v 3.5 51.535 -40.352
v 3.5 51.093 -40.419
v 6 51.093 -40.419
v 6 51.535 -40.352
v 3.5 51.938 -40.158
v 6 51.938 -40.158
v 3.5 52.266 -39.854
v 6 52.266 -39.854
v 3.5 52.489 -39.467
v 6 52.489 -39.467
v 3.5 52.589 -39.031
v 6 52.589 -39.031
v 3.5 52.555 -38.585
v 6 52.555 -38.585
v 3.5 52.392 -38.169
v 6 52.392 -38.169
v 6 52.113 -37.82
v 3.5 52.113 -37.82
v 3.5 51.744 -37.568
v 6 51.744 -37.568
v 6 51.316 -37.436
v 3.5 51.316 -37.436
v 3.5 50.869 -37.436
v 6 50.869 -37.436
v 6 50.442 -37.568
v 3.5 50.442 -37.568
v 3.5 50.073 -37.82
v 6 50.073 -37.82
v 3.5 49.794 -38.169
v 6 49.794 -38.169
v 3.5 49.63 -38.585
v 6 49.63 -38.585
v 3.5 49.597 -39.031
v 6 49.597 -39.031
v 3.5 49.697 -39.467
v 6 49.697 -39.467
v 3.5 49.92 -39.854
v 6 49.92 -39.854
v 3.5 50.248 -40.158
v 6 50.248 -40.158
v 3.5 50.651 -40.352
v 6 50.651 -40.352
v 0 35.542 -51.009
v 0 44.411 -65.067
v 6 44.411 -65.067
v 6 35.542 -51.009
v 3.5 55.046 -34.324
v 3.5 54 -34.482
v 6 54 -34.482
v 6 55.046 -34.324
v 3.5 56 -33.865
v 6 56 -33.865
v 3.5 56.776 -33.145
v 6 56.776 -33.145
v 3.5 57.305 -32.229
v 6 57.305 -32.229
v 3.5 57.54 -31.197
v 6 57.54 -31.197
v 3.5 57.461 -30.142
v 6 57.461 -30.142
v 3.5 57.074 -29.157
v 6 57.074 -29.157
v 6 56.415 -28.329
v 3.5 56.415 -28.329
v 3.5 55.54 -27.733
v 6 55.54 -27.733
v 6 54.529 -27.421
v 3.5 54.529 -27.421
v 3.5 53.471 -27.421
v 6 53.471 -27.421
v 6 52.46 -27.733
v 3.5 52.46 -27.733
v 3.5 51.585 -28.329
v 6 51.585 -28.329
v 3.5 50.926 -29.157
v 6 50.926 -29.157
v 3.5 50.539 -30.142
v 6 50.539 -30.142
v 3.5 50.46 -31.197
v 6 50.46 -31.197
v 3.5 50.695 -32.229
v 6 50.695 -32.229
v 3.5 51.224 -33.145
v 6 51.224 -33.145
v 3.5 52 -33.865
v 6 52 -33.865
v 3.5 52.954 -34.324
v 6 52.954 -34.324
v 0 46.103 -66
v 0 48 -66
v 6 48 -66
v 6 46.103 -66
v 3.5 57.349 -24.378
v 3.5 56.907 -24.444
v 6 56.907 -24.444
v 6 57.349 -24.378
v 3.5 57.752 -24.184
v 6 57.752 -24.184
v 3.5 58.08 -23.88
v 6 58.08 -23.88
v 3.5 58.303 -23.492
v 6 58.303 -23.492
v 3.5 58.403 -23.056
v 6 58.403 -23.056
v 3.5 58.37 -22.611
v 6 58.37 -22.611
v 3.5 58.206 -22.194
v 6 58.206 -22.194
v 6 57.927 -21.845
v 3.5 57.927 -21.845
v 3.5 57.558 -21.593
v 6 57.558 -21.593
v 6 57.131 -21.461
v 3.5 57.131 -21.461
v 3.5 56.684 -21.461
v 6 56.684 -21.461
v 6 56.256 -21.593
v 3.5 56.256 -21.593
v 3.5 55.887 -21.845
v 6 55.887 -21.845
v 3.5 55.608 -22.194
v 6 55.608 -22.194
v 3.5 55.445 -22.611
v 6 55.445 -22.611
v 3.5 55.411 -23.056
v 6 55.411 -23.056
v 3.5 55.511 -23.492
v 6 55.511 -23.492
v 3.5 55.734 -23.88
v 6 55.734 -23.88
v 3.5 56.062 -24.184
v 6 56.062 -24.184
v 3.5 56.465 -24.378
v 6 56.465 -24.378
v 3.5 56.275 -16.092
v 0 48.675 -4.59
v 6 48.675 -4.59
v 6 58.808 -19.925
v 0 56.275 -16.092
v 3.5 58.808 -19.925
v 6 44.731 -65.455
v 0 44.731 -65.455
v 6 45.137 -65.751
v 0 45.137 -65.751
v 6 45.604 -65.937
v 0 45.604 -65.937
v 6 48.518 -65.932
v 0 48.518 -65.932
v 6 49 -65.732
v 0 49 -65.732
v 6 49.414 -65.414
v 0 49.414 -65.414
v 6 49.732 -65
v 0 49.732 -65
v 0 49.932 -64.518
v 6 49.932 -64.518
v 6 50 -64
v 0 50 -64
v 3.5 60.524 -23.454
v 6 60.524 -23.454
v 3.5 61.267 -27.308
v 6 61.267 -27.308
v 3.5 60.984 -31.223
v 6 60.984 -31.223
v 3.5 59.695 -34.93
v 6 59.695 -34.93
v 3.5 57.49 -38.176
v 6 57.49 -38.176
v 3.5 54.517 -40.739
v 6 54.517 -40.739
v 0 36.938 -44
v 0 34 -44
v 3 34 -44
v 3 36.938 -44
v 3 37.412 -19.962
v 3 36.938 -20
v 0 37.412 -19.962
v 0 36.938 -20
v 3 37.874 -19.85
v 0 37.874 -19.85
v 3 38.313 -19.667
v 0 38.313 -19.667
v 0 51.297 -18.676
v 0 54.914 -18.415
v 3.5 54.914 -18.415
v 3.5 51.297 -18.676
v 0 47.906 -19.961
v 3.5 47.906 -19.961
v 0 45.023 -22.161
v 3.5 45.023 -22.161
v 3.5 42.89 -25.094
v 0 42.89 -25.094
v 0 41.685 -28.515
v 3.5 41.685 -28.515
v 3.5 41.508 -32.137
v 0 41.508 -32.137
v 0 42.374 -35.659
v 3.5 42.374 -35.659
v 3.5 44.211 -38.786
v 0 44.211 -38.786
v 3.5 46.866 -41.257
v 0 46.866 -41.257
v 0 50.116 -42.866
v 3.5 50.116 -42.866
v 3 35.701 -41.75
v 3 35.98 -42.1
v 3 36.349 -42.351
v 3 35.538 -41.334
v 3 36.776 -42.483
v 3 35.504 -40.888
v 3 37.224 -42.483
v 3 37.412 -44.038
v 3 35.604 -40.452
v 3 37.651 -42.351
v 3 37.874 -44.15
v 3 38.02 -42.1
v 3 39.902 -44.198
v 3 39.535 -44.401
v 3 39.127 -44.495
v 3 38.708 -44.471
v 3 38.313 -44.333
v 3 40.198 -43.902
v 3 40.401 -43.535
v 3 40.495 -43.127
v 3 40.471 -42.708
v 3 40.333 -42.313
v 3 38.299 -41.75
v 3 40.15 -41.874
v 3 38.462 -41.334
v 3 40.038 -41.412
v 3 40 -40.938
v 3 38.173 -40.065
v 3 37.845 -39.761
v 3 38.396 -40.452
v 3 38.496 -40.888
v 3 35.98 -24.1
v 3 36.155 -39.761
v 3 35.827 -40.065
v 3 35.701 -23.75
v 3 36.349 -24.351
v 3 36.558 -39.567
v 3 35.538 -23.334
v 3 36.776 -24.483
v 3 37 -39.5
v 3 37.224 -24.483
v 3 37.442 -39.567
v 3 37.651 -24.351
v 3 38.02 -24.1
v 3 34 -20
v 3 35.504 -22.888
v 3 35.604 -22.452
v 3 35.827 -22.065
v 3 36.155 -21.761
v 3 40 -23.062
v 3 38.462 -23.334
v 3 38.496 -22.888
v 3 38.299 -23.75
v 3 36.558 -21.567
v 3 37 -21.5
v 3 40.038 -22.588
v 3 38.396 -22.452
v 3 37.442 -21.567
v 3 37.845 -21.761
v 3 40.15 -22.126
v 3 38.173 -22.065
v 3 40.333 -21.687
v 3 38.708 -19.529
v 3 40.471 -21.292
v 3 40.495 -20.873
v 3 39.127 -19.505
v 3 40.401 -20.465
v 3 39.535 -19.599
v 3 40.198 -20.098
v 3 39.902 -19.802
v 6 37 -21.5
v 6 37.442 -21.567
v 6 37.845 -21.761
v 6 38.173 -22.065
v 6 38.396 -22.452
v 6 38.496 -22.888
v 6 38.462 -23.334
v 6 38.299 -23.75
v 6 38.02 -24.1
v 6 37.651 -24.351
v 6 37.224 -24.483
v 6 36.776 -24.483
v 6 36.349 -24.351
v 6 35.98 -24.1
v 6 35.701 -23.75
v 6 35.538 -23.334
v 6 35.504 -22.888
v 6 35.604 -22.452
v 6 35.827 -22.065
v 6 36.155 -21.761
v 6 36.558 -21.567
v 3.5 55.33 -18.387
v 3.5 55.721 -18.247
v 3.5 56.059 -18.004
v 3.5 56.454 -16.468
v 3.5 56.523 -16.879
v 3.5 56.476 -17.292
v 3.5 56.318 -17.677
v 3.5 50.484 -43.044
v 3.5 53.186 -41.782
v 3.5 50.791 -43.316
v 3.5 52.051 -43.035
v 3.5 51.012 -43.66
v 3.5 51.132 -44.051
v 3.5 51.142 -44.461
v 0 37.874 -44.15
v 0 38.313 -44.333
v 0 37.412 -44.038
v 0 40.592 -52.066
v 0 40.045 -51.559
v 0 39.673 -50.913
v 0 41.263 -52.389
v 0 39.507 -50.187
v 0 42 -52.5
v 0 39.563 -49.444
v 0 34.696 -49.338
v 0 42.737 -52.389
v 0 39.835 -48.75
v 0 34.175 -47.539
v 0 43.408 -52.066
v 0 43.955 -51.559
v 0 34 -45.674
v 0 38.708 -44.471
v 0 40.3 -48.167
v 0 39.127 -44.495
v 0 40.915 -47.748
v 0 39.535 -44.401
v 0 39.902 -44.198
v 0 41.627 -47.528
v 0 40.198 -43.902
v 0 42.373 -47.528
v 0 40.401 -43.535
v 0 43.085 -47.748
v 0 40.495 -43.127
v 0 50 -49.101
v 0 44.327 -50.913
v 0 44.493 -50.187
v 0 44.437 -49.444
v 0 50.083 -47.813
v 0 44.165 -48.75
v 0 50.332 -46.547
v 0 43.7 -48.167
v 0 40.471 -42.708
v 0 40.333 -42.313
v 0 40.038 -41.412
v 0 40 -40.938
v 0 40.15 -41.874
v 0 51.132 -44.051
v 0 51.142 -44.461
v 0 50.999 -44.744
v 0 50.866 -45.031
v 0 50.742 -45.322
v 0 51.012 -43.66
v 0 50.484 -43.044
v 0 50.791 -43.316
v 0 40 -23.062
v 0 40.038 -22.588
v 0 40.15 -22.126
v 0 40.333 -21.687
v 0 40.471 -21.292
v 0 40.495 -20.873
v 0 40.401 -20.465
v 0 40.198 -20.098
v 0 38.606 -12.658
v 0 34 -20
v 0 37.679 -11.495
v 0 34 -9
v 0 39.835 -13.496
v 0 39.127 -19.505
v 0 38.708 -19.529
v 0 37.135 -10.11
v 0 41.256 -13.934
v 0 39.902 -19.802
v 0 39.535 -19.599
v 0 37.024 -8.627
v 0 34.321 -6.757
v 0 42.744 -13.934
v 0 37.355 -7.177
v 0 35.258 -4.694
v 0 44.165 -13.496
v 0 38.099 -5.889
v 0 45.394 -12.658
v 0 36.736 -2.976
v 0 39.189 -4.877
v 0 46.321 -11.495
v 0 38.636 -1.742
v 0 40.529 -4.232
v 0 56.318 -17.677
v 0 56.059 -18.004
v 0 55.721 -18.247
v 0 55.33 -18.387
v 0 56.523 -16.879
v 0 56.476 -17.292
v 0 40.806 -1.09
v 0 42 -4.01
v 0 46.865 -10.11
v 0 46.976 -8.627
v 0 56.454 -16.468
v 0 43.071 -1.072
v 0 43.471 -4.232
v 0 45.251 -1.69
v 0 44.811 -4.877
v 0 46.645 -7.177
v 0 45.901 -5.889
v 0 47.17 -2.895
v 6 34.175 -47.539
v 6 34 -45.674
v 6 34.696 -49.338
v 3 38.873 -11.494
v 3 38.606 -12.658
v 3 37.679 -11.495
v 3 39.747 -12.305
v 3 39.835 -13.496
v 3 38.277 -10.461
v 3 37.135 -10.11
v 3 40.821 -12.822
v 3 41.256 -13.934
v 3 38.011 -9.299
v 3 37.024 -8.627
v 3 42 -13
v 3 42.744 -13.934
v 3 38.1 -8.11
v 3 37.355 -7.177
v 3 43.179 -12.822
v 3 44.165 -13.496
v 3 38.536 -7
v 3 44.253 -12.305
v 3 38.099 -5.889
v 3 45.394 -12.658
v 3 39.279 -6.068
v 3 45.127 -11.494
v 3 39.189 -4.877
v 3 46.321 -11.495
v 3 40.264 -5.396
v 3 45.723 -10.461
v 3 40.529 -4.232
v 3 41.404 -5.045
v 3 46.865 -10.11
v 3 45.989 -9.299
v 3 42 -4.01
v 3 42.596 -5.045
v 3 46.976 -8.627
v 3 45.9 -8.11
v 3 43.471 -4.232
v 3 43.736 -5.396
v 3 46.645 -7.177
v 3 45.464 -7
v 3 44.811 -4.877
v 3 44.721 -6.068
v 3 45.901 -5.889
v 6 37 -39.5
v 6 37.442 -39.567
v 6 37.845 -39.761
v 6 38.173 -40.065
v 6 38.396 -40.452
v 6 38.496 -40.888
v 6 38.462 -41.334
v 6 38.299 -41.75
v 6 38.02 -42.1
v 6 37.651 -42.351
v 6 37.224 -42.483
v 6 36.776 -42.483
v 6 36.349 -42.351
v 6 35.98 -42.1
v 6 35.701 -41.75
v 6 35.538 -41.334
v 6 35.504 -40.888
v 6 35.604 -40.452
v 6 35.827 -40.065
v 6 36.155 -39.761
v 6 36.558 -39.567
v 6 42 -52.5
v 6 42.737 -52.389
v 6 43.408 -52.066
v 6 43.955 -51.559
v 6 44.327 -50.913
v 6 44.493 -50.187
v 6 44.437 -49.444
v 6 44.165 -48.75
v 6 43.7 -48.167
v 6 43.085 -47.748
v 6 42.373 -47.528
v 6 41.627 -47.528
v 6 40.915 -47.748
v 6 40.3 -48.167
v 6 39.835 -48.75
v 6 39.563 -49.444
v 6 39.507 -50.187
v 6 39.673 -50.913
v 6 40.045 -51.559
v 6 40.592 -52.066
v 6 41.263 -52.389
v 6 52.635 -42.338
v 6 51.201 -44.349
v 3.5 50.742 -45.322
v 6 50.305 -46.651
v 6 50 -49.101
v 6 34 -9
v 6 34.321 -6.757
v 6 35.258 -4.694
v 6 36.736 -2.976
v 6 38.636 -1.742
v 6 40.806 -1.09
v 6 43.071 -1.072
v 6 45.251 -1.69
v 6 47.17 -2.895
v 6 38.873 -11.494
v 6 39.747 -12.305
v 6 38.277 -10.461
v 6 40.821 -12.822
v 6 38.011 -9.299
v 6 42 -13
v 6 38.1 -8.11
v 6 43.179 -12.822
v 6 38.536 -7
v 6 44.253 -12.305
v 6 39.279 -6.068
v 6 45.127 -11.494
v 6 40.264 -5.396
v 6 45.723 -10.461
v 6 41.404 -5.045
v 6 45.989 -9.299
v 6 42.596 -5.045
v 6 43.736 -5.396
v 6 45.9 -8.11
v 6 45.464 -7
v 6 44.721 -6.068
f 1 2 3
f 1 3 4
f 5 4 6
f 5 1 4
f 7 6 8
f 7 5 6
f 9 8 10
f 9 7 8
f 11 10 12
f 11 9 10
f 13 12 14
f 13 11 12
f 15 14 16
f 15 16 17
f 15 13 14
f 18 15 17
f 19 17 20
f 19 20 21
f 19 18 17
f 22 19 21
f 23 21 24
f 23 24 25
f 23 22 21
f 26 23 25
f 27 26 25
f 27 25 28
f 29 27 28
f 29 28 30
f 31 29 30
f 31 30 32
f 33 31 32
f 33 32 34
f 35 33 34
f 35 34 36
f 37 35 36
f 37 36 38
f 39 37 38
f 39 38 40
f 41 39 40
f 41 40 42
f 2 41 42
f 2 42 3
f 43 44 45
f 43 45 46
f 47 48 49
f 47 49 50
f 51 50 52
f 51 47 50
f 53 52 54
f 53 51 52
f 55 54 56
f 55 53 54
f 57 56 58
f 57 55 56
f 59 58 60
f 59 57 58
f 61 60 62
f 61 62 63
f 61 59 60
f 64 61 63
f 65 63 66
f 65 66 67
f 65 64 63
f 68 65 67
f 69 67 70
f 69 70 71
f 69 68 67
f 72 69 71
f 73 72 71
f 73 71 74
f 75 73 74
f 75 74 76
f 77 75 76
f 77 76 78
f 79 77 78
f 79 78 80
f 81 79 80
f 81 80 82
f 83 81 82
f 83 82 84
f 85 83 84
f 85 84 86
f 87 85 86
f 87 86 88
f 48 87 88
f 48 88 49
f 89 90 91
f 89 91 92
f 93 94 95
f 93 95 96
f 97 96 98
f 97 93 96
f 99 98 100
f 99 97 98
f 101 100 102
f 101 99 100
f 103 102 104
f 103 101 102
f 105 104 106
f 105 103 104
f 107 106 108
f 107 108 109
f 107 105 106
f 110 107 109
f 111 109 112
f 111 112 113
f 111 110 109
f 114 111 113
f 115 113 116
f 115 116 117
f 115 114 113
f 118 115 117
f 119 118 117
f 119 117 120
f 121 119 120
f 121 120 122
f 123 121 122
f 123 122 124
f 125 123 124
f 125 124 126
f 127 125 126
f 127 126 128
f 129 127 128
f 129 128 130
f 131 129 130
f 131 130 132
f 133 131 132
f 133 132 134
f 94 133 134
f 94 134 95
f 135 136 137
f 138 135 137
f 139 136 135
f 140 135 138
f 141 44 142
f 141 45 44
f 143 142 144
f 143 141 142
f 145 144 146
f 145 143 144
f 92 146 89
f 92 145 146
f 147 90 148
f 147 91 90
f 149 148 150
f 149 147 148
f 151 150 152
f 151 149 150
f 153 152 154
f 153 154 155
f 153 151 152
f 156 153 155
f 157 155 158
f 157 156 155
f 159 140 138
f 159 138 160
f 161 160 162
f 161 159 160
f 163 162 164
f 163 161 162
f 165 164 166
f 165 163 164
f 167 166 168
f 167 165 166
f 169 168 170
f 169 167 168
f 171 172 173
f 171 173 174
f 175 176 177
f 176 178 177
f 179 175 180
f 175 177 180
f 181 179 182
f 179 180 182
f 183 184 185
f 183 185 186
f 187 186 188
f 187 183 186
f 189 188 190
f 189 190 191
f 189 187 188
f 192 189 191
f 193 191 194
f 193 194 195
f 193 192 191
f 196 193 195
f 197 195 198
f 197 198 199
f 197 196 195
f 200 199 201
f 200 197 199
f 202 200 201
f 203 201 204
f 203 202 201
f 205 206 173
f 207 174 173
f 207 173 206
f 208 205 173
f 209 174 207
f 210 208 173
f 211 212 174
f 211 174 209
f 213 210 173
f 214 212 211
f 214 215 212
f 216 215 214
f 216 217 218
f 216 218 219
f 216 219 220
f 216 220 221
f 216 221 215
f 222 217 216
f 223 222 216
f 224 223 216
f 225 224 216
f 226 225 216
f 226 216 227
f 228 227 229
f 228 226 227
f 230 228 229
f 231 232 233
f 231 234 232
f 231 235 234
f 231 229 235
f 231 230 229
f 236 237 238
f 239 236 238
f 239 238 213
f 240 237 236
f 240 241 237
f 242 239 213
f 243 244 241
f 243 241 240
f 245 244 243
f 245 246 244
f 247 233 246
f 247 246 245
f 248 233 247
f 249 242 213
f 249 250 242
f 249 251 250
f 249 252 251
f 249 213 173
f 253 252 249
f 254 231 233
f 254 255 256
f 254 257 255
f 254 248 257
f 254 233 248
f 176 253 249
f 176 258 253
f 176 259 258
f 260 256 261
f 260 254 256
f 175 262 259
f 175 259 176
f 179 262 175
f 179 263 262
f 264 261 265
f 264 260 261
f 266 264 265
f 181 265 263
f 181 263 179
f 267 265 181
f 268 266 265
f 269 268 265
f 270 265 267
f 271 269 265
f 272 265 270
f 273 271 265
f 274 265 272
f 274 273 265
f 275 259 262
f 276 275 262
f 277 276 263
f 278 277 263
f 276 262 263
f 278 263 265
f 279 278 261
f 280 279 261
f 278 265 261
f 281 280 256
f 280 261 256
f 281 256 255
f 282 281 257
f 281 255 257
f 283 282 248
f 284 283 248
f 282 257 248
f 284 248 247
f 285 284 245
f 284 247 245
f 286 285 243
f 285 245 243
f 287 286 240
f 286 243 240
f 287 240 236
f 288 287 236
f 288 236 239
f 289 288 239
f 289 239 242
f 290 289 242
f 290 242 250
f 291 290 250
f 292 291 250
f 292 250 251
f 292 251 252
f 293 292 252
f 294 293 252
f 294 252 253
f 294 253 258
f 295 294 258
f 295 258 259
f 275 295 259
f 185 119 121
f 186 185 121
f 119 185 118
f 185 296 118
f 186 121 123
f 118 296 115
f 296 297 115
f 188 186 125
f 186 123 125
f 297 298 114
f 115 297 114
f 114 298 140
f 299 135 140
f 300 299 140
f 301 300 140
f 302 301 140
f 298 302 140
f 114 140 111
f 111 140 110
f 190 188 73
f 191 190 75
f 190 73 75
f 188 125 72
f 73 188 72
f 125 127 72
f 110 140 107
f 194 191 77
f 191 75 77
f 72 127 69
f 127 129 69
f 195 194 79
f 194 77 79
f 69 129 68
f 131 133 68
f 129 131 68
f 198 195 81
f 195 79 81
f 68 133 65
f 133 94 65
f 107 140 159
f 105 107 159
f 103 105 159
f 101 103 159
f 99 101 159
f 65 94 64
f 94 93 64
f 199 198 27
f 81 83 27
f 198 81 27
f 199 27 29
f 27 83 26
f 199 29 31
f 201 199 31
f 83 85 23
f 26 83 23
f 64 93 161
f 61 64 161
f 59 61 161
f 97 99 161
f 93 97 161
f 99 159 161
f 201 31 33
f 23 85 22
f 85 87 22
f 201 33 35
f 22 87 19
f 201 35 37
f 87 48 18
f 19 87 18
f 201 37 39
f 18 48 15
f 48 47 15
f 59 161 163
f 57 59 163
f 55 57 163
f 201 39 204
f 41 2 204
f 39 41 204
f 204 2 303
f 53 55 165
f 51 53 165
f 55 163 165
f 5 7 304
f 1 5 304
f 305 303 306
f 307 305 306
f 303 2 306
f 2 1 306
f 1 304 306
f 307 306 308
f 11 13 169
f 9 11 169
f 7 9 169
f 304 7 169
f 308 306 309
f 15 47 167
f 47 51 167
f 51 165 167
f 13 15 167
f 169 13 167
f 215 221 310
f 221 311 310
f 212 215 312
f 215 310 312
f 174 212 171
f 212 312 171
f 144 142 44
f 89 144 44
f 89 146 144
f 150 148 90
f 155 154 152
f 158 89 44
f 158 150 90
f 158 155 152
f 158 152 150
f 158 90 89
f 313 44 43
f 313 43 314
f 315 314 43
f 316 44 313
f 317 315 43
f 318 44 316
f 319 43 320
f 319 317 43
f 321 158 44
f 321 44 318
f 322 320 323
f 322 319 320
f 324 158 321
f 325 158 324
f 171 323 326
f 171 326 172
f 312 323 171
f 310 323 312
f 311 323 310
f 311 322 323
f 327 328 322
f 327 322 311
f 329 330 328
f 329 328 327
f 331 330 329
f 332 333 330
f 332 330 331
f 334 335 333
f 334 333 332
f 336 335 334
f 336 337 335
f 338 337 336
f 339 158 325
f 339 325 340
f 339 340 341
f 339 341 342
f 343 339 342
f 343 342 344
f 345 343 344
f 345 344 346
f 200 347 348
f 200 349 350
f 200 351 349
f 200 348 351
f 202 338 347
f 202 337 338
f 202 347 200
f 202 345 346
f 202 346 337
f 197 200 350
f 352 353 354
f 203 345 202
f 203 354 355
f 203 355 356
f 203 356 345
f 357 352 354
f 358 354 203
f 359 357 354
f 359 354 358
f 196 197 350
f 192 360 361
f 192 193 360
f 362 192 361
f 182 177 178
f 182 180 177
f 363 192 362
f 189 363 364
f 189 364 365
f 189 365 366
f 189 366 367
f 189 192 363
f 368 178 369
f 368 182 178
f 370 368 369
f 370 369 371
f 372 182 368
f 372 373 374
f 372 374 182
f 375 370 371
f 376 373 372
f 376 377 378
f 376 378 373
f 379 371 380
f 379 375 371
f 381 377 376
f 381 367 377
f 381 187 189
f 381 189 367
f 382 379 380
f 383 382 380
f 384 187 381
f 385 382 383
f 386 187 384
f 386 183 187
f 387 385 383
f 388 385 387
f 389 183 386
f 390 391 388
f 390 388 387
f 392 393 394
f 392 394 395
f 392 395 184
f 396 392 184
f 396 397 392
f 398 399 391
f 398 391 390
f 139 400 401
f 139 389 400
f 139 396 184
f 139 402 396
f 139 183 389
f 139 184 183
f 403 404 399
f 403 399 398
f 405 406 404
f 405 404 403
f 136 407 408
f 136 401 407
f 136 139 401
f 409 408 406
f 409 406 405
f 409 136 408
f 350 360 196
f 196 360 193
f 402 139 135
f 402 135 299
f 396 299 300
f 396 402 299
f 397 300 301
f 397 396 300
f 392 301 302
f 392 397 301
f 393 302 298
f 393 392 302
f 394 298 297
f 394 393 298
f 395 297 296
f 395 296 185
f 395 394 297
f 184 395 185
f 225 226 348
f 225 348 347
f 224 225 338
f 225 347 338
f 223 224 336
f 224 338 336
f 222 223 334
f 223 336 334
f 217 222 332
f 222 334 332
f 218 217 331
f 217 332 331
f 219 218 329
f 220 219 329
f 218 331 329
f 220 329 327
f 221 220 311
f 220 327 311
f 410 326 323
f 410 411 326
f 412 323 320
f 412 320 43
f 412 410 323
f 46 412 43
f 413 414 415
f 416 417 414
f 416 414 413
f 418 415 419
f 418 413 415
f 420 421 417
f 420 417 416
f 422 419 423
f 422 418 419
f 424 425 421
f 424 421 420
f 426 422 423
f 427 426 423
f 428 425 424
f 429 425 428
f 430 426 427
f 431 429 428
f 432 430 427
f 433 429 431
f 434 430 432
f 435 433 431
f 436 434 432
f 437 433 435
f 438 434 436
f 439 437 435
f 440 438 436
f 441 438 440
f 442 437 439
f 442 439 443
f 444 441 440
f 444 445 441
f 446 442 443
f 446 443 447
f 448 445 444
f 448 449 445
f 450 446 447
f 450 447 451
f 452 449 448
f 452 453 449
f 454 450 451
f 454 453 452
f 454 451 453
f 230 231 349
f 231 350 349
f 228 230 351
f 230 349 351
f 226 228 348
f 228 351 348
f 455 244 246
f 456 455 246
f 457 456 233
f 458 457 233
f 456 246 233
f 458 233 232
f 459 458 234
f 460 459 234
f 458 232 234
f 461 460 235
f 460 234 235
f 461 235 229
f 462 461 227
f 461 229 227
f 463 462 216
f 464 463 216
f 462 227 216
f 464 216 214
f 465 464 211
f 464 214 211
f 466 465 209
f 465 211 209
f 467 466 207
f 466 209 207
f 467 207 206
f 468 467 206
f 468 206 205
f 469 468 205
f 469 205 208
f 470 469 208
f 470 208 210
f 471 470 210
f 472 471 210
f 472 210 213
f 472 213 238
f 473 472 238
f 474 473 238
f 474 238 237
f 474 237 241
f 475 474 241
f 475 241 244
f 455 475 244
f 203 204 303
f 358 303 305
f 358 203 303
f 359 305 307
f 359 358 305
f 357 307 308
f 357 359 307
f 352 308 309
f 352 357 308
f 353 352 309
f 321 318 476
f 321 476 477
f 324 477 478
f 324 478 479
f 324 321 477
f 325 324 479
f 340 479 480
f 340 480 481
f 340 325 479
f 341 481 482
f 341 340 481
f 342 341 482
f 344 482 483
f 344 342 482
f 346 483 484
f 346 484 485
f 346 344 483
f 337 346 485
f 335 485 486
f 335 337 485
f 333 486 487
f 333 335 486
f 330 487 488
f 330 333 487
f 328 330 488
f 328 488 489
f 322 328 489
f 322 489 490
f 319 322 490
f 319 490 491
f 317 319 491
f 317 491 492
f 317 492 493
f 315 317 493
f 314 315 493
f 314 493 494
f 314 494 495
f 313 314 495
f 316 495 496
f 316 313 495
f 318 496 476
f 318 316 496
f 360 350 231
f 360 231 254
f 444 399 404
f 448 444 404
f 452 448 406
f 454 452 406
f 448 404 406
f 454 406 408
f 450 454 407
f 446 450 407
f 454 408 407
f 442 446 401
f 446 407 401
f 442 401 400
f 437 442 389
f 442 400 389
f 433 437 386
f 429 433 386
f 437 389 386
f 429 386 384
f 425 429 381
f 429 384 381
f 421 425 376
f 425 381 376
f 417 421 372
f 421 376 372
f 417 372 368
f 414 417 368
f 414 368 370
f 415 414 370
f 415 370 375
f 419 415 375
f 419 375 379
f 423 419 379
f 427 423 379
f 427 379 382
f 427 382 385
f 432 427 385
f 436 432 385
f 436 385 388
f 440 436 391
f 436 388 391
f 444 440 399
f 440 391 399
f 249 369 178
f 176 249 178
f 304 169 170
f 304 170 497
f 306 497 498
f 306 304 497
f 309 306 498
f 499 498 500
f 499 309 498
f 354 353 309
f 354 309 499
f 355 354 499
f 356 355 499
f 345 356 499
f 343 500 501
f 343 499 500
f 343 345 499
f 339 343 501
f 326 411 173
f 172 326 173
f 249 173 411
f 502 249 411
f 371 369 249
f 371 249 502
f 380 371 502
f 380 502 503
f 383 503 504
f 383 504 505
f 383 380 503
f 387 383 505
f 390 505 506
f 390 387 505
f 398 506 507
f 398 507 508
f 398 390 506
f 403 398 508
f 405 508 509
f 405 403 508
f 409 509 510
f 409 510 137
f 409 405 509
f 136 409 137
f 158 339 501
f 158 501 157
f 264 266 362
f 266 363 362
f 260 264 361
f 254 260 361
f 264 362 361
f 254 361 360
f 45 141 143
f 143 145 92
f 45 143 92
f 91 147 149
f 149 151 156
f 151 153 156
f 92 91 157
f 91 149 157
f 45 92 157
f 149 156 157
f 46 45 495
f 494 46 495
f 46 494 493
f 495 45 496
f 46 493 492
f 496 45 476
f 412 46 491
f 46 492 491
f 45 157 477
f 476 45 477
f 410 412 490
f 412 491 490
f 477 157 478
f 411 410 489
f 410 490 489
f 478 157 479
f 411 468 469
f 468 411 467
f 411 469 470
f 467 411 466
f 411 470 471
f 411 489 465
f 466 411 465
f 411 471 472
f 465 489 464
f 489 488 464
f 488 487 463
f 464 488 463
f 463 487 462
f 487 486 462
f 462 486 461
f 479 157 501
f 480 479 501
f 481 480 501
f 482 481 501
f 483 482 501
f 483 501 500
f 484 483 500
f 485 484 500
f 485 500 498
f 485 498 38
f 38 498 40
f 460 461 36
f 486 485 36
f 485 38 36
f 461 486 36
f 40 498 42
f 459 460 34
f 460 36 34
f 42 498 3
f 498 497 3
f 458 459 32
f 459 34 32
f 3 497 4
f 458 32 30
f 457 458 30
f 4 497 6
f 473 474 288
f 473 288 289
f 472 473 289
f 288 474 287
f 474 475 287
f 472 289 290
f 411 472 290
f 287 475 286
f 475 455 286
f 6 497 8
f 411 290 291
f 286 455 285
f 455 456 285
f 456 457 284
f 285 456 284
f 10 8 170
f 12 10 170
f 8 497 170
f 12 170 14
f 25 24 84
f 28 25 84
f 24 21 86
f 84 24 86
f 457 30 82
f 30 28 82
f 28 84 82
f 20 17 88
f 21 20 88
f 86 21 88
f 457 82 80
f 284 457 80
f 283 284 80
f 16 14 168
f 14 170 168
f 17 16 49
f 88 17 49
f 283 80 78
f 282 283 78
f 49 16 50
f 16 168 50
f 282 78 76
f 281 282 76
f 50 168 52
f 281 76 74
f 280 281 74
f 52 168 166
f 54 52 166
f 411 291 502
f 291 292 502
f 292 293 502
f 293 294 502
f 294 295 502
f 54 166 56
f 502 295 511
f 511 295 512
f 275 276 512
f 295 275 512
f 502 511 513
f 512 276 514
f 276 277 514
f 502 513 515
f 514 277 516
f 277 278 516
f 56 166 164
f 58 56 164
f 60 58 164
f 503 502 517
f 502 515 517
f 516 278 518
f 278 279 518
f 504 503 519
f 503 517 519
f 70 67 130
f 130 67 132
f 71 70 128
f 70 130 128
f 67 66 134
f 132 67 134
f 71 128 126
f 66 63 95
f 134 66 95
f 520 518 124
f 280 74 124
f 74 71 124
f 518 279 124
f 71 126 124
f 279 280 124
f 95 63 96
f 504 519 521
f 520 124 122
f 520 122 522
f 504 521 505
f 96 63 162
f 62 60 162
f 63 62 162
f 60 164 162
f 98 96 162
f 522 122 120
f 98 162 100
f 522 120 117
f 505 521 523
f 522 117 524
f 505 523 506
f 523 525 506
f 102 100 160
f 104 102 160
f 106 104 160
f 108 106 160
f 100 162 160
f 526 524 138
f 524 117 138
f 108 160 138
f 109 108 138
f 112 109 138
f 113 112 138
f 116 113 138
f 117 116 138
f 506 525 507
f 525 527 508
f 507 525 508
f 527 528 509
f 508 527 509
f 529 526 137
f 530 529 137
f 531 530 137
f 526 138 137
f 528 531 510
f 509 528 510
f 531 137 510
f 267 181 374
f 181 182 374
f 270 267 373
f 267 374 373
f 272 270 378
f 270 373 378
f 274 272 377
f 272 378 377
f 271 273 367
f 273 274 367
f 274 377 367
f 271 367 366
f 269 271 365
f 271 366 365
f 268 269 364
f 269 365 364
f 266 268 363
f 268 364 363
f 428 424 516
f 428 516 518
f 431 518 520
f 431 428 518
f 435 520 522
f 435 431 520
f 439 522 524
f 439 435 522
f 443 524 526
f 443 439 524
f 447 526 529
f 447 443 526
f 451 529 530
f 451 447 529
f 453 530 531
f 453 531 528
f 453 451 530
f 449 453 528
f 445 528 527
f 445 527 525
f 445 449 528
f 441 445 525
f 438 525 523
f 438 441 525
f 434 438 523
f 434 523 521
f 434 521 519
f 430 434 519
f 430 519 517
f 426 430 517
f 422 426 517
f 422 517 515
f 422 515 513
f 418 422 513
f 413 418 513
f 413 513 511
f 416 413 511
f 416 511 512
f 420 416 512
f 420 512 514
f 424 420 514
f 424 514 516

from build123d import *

# Parameters (mm, degrees)
SKETCH27_R          = 3.55
SKETCH27_R_2        = 4
SKETCH27_R_3        = 2.5
SKETCH27_R_4        = 1.5
BOSS_EXTRUDE1_DEPTH = 6
SKETCH47_R          = 4.99
CUT_EXTRUDE8_DEPTH  = 3
CUT_EXTRUDE10_DEPTH = 3.5
SKETCH49_W          = 24
SKETCH49_H          = 6
CUT_EXTRUDE11_DEPTH = 3
SKETCH50_R          = 1.5
CUT_EXTRUDE12_DEPTH = 3
FILLET1_R           = 3
CUT_EXTRUDE13_REACH = 5
SKETCH51_R          = 1.5
FILLET2_R           = 10
FILLET3_R           = 2


with BuildPart() as part:
    # Sketch27 → Boss-Extrude1 (new body)
    with BuildSketch(Plane(origin=(0, 0, 0), x_dir=(0, 0, -1), z_dir=(1, 0, 0))):
        with BuildLine():
            Line((4.589716929, 48.674533934), (19.924994259, 58.807513206))
            ThreePointArc((19.924994259, 58.807513206), (31.222626062, 60.983884909), (40.738603868, 54.517104832))
            ThreePointArc((40.738603868, 54.517104832), (44.34906679, 51.201450356), (49.101489768, 50))
            Line((49.101489768, 50), (66, 50))
            Line((66, 50), (66, 45))
            Line((66, 45), (48.564398788, 34))
            Line((48.564398788, 34), (9, 34))
            ThreePointArc((9, 34), (1.33852914, 39.697422256), (4.589716929, 48.674533934))
        make_face()
        with Locations((30.931712199, 54)):
            Circle(SKETCH27_R, mode=Mode.SUBTRACT)
        with Locations((9, 42)):
            Circle(SKETCH27_R_2, mode=Mode.SUBTRACT)
        with Locations((50, 42)):
            Circle(SKETCH27_R_3, mode=Mode.SUBTRACT)
        with Locations((38.919099476, 51.092828782)):
            Circle(SKETCH27_R_4, mode=Mode.SUBTRACT)
        with Locations((22.944324923, 56.907171218)):
            Circle(SKETCH27_R_4, mode=Mode.SUBTRACT)
    extrude(amount=BOSS_EXTRUDE1_DEPTH)

    # Sketch47 → Cut-Extrude8 (cut)
    with BuildSketch(Plane.ZY):
        with Locations((-9, 42)):
            Circle(SKETCH47_R)
    extrude(amount=-CUT_EXTRUDE8_DEPTH, mode=Mode.SUBTRACT)

    # Sketch48 → Cut-Extrude10 (cut)
    with BuildSketch(Plane.ZY):
        with BuildLine():
            Line((-45.322401917, 50.741571677), (-29.852897284, 65.367501227))
            Line((-29.852897284, 65.367501227), (-16.092106493, 56.274883933))
            ThreePointArc((-16.092106493, 56.274883933), (-17.677203396, 56.31769628), (-18.415049974, 54.914148092))
            ThreePointArc((-18.415049974, 54.914148092), (-28.514928411, 41.684901295), (-42.865524712, 50.115850296))
            ThreePointArc((-42.865524712, 50.115850296), (-43.921672049, 51.10520774), (-45.322401917, 50.741571677))
        make_face()
    extrude(amount=-CUT_EXTRUDE10_DEPTH, mode=Mode.SUBTRACT)

    # Sketch49 → Cut-Extrude11 (cut)
    with BuildSketch(Plane.ZY):
        with Locations((-32, 37)):
            Rectangle(SKETCH49_W, SKETCH49_H)
    extrude(amount=-CUT_EXTRUDE11_DEPTH, mode=Mode.SUBTRACT)

    # Sketch50 → Cut-Extrude12 (cut)
    with BuildSketch(Plane.ZY):
        with Locations((-43, 39)):
            Circle(SKETCH50_R)
        with Locations((-21, 39)):
            Circle(SKETCH50_R)
    extrude(amount=-CUT_EXTRUDE12_DEPTH, mode=Mode.SUBTRACT)

    # Fillet1
    fillet1_edges = [part.edges().sort_by_distance(p)[0] for p in [
        (1.5, 37.881966011, -44),
        (1.5, 40, -41.881966011),
        (1.5, 40, -22.118033989),
        (1.5, 37.881966011, -20),
    ]]
    fillet(fillet1_edges, radius=FILLET1_R)

    # Sketch51 → Cut-Extrude13 (cut, up to next)
    with BuildSketch(Plane.ZY.offset(-3), mode=Mode.PRIVATE) as cut_extrude13_sk1:
        with Locations((-41, 37)):
            Circle(SKETCH51_R)
    cut_extrude13_tool1 = extrude(cut_extrude13_sk1.sketch, amount=-CUT_EXTRUDE13_REACH, mode=Mode.PRIVATE) & part.part
    add(cut_extrude13_tool1.solids().sort_by_distance((3, 37, -41))[0], mode=Mode.SUBTRACT)
    # Sketch51 → Cut-Extrude13 (cut, up to next)
    with BuildSketch(Plane.ZY.offset(-3), mode=Mode.PRIVATE) as cut_extrude13_sk2:
        with Locations((-23, 37)):
            Circle(SKETCH51_R)
    cut_extrude13_tool2 = extrude(cut_extrude13_sk2.sketch, amount=-CUT_EXTRUDE13_REACH, mode=Mode.PRIVATE) & part.part
    add(cut_extrude13_tool2.solids().sort_by_distance((3, 37, -23))[0], mode=Mode.SUBTRACT)

    # Fillet2
    fillet2_edges = [part.edges().sort_by_distance(p)[0] for p in [
        (3, 34, -48.564398788),
    ]]
    fillet(fillet2_edges, radius=FILLET2_R)

    # Fillet3
    fillet3_edges = [part.edges().sort_by_distance(p)[0] for p in [
        (3, 50, -66),
        (3, 45, -66),
    ]]
    fillet(fillet3_edges, radius=FILLET3_R)


solid = part.part
